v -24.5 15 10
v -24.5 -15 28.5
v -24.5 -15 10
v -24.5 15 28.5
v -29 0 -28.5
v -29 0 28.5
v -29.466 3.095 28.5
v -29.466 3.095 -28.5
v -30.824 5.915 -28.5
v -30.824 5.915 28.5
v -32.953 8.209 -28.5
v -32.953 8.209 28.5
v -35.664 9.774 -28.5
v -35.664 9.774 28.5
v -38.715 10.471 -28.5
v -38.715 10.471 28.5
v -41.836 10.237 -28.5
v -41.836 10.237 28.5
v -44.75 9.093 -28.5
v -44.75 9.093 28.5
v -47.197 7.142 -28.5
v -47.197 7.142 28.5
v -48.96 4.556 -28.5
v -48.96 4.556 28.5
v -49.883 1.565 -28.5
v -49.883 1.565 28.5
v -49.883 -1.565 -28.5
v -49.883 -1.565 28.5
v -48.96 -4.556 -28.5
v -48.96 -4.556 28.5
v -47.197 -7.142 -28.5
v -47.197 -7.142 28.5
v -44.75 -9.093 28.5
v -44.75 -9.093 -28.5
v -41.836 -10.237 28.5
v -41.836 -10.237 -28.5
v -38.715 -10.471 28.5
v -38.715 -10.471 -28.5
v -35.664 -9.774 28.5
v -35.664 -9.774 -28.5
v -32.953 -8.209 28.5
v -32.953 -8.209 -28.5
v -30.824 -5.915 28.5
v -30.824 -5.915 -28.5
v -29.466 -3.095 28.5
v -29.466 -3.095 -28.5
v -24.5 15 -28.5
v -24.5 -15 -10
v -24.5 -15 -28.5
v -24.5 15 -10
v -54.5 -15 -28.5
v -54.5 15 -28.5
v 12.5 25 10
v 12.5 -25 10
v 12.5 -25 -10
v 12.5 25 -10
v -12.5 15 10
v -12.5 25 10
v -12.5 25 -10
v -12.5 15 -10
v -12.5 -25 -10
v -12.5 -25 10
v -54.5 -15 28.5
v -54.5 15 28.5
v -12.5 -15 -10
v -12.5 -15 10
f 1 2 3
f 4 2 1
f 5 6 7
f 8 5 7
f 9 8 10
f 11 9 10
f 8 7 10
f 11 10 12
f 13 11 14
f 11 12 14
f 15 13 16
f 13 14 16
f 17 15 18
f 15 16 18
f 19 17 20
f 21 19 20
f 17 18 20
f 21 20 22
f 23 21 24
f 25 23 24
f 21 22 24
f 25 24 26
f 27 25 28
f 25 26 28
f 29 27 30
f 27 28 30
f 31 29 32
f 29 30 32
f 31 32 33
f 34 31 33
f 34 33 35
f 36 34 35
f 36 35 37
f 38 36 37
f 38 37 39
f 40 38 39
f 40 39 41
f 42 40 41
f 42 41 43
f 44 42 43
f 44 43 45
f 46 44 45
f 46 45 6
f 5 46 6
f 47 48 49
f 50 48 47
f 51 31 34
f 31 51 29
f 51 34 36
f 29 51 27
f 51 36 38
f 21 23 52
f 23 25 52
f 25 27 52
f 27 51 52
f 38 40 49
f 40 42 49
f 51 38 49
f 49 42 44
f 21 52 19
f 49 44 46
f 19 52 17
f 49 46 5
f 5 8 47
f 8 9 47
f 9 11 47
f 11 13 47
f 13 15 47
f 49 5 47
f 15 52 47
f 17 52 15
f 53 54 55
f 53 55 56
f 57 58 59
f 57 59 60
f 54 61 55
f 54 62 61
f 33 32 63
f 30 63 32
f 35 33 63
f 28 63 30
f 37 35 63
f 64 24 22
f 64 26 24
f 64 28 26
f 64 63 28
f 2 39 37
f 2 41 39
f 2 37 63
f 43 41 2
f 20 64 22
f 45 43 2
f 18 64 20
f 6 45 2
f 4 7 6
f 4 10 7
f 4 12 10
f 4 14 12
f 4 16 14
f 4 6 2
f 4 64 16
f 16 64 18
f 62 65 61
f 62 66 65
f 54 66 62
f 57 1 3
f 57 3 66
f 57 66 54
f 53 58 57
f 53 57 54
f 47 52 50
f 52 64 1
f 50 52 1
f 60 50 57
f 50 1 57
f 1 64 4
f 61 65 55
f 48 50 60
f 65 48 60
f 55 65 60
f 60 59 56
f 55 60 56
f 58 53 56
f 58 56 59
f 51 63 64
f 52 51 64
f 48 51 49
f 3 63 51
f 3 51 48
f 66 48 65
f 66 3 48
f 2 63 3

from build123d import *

# Parameters (mm, degrees)
F1_DEPTH = 10
F2_W     = 30
F2_H     = 30
F3_DEPTH = 28.5
F4_R     = 10.5
F5_DEPTH = 57.001


with BuildPart() as f1:
    # F0 (on Top) → F1 (new body, symmetric)
    with BuildSketch(Plane.XY):
        Polygon((-12.5, -25), (12.5, -25), (12.5, 25), (-12.5, 25), (-12.5, 15), (-54.5, 15), (-54.5, -15), (-12.5, -15), align=None)
    extrude(amount=F1_DEPTH, both=True)

    # F2 (on Top) → F3 (join, symmetric)
    with BuildSketch(Plane.XY):
        with Locations((-39.5, 0)):
            Rectangle(F2_W, F2_H)
    extrude(amount=F3_DEPTH, both=True)

    # F4 (on face) → F5 (cut, through all)
    with BuildSketch(Plane.XY.offset(28.5)):
        with Locations((-39.5, 0)):
            Circle(F4_R)
    extrude(amount=-F5_DEPTH, mode=Mode.SUBTRACT)


solid = f1.part
